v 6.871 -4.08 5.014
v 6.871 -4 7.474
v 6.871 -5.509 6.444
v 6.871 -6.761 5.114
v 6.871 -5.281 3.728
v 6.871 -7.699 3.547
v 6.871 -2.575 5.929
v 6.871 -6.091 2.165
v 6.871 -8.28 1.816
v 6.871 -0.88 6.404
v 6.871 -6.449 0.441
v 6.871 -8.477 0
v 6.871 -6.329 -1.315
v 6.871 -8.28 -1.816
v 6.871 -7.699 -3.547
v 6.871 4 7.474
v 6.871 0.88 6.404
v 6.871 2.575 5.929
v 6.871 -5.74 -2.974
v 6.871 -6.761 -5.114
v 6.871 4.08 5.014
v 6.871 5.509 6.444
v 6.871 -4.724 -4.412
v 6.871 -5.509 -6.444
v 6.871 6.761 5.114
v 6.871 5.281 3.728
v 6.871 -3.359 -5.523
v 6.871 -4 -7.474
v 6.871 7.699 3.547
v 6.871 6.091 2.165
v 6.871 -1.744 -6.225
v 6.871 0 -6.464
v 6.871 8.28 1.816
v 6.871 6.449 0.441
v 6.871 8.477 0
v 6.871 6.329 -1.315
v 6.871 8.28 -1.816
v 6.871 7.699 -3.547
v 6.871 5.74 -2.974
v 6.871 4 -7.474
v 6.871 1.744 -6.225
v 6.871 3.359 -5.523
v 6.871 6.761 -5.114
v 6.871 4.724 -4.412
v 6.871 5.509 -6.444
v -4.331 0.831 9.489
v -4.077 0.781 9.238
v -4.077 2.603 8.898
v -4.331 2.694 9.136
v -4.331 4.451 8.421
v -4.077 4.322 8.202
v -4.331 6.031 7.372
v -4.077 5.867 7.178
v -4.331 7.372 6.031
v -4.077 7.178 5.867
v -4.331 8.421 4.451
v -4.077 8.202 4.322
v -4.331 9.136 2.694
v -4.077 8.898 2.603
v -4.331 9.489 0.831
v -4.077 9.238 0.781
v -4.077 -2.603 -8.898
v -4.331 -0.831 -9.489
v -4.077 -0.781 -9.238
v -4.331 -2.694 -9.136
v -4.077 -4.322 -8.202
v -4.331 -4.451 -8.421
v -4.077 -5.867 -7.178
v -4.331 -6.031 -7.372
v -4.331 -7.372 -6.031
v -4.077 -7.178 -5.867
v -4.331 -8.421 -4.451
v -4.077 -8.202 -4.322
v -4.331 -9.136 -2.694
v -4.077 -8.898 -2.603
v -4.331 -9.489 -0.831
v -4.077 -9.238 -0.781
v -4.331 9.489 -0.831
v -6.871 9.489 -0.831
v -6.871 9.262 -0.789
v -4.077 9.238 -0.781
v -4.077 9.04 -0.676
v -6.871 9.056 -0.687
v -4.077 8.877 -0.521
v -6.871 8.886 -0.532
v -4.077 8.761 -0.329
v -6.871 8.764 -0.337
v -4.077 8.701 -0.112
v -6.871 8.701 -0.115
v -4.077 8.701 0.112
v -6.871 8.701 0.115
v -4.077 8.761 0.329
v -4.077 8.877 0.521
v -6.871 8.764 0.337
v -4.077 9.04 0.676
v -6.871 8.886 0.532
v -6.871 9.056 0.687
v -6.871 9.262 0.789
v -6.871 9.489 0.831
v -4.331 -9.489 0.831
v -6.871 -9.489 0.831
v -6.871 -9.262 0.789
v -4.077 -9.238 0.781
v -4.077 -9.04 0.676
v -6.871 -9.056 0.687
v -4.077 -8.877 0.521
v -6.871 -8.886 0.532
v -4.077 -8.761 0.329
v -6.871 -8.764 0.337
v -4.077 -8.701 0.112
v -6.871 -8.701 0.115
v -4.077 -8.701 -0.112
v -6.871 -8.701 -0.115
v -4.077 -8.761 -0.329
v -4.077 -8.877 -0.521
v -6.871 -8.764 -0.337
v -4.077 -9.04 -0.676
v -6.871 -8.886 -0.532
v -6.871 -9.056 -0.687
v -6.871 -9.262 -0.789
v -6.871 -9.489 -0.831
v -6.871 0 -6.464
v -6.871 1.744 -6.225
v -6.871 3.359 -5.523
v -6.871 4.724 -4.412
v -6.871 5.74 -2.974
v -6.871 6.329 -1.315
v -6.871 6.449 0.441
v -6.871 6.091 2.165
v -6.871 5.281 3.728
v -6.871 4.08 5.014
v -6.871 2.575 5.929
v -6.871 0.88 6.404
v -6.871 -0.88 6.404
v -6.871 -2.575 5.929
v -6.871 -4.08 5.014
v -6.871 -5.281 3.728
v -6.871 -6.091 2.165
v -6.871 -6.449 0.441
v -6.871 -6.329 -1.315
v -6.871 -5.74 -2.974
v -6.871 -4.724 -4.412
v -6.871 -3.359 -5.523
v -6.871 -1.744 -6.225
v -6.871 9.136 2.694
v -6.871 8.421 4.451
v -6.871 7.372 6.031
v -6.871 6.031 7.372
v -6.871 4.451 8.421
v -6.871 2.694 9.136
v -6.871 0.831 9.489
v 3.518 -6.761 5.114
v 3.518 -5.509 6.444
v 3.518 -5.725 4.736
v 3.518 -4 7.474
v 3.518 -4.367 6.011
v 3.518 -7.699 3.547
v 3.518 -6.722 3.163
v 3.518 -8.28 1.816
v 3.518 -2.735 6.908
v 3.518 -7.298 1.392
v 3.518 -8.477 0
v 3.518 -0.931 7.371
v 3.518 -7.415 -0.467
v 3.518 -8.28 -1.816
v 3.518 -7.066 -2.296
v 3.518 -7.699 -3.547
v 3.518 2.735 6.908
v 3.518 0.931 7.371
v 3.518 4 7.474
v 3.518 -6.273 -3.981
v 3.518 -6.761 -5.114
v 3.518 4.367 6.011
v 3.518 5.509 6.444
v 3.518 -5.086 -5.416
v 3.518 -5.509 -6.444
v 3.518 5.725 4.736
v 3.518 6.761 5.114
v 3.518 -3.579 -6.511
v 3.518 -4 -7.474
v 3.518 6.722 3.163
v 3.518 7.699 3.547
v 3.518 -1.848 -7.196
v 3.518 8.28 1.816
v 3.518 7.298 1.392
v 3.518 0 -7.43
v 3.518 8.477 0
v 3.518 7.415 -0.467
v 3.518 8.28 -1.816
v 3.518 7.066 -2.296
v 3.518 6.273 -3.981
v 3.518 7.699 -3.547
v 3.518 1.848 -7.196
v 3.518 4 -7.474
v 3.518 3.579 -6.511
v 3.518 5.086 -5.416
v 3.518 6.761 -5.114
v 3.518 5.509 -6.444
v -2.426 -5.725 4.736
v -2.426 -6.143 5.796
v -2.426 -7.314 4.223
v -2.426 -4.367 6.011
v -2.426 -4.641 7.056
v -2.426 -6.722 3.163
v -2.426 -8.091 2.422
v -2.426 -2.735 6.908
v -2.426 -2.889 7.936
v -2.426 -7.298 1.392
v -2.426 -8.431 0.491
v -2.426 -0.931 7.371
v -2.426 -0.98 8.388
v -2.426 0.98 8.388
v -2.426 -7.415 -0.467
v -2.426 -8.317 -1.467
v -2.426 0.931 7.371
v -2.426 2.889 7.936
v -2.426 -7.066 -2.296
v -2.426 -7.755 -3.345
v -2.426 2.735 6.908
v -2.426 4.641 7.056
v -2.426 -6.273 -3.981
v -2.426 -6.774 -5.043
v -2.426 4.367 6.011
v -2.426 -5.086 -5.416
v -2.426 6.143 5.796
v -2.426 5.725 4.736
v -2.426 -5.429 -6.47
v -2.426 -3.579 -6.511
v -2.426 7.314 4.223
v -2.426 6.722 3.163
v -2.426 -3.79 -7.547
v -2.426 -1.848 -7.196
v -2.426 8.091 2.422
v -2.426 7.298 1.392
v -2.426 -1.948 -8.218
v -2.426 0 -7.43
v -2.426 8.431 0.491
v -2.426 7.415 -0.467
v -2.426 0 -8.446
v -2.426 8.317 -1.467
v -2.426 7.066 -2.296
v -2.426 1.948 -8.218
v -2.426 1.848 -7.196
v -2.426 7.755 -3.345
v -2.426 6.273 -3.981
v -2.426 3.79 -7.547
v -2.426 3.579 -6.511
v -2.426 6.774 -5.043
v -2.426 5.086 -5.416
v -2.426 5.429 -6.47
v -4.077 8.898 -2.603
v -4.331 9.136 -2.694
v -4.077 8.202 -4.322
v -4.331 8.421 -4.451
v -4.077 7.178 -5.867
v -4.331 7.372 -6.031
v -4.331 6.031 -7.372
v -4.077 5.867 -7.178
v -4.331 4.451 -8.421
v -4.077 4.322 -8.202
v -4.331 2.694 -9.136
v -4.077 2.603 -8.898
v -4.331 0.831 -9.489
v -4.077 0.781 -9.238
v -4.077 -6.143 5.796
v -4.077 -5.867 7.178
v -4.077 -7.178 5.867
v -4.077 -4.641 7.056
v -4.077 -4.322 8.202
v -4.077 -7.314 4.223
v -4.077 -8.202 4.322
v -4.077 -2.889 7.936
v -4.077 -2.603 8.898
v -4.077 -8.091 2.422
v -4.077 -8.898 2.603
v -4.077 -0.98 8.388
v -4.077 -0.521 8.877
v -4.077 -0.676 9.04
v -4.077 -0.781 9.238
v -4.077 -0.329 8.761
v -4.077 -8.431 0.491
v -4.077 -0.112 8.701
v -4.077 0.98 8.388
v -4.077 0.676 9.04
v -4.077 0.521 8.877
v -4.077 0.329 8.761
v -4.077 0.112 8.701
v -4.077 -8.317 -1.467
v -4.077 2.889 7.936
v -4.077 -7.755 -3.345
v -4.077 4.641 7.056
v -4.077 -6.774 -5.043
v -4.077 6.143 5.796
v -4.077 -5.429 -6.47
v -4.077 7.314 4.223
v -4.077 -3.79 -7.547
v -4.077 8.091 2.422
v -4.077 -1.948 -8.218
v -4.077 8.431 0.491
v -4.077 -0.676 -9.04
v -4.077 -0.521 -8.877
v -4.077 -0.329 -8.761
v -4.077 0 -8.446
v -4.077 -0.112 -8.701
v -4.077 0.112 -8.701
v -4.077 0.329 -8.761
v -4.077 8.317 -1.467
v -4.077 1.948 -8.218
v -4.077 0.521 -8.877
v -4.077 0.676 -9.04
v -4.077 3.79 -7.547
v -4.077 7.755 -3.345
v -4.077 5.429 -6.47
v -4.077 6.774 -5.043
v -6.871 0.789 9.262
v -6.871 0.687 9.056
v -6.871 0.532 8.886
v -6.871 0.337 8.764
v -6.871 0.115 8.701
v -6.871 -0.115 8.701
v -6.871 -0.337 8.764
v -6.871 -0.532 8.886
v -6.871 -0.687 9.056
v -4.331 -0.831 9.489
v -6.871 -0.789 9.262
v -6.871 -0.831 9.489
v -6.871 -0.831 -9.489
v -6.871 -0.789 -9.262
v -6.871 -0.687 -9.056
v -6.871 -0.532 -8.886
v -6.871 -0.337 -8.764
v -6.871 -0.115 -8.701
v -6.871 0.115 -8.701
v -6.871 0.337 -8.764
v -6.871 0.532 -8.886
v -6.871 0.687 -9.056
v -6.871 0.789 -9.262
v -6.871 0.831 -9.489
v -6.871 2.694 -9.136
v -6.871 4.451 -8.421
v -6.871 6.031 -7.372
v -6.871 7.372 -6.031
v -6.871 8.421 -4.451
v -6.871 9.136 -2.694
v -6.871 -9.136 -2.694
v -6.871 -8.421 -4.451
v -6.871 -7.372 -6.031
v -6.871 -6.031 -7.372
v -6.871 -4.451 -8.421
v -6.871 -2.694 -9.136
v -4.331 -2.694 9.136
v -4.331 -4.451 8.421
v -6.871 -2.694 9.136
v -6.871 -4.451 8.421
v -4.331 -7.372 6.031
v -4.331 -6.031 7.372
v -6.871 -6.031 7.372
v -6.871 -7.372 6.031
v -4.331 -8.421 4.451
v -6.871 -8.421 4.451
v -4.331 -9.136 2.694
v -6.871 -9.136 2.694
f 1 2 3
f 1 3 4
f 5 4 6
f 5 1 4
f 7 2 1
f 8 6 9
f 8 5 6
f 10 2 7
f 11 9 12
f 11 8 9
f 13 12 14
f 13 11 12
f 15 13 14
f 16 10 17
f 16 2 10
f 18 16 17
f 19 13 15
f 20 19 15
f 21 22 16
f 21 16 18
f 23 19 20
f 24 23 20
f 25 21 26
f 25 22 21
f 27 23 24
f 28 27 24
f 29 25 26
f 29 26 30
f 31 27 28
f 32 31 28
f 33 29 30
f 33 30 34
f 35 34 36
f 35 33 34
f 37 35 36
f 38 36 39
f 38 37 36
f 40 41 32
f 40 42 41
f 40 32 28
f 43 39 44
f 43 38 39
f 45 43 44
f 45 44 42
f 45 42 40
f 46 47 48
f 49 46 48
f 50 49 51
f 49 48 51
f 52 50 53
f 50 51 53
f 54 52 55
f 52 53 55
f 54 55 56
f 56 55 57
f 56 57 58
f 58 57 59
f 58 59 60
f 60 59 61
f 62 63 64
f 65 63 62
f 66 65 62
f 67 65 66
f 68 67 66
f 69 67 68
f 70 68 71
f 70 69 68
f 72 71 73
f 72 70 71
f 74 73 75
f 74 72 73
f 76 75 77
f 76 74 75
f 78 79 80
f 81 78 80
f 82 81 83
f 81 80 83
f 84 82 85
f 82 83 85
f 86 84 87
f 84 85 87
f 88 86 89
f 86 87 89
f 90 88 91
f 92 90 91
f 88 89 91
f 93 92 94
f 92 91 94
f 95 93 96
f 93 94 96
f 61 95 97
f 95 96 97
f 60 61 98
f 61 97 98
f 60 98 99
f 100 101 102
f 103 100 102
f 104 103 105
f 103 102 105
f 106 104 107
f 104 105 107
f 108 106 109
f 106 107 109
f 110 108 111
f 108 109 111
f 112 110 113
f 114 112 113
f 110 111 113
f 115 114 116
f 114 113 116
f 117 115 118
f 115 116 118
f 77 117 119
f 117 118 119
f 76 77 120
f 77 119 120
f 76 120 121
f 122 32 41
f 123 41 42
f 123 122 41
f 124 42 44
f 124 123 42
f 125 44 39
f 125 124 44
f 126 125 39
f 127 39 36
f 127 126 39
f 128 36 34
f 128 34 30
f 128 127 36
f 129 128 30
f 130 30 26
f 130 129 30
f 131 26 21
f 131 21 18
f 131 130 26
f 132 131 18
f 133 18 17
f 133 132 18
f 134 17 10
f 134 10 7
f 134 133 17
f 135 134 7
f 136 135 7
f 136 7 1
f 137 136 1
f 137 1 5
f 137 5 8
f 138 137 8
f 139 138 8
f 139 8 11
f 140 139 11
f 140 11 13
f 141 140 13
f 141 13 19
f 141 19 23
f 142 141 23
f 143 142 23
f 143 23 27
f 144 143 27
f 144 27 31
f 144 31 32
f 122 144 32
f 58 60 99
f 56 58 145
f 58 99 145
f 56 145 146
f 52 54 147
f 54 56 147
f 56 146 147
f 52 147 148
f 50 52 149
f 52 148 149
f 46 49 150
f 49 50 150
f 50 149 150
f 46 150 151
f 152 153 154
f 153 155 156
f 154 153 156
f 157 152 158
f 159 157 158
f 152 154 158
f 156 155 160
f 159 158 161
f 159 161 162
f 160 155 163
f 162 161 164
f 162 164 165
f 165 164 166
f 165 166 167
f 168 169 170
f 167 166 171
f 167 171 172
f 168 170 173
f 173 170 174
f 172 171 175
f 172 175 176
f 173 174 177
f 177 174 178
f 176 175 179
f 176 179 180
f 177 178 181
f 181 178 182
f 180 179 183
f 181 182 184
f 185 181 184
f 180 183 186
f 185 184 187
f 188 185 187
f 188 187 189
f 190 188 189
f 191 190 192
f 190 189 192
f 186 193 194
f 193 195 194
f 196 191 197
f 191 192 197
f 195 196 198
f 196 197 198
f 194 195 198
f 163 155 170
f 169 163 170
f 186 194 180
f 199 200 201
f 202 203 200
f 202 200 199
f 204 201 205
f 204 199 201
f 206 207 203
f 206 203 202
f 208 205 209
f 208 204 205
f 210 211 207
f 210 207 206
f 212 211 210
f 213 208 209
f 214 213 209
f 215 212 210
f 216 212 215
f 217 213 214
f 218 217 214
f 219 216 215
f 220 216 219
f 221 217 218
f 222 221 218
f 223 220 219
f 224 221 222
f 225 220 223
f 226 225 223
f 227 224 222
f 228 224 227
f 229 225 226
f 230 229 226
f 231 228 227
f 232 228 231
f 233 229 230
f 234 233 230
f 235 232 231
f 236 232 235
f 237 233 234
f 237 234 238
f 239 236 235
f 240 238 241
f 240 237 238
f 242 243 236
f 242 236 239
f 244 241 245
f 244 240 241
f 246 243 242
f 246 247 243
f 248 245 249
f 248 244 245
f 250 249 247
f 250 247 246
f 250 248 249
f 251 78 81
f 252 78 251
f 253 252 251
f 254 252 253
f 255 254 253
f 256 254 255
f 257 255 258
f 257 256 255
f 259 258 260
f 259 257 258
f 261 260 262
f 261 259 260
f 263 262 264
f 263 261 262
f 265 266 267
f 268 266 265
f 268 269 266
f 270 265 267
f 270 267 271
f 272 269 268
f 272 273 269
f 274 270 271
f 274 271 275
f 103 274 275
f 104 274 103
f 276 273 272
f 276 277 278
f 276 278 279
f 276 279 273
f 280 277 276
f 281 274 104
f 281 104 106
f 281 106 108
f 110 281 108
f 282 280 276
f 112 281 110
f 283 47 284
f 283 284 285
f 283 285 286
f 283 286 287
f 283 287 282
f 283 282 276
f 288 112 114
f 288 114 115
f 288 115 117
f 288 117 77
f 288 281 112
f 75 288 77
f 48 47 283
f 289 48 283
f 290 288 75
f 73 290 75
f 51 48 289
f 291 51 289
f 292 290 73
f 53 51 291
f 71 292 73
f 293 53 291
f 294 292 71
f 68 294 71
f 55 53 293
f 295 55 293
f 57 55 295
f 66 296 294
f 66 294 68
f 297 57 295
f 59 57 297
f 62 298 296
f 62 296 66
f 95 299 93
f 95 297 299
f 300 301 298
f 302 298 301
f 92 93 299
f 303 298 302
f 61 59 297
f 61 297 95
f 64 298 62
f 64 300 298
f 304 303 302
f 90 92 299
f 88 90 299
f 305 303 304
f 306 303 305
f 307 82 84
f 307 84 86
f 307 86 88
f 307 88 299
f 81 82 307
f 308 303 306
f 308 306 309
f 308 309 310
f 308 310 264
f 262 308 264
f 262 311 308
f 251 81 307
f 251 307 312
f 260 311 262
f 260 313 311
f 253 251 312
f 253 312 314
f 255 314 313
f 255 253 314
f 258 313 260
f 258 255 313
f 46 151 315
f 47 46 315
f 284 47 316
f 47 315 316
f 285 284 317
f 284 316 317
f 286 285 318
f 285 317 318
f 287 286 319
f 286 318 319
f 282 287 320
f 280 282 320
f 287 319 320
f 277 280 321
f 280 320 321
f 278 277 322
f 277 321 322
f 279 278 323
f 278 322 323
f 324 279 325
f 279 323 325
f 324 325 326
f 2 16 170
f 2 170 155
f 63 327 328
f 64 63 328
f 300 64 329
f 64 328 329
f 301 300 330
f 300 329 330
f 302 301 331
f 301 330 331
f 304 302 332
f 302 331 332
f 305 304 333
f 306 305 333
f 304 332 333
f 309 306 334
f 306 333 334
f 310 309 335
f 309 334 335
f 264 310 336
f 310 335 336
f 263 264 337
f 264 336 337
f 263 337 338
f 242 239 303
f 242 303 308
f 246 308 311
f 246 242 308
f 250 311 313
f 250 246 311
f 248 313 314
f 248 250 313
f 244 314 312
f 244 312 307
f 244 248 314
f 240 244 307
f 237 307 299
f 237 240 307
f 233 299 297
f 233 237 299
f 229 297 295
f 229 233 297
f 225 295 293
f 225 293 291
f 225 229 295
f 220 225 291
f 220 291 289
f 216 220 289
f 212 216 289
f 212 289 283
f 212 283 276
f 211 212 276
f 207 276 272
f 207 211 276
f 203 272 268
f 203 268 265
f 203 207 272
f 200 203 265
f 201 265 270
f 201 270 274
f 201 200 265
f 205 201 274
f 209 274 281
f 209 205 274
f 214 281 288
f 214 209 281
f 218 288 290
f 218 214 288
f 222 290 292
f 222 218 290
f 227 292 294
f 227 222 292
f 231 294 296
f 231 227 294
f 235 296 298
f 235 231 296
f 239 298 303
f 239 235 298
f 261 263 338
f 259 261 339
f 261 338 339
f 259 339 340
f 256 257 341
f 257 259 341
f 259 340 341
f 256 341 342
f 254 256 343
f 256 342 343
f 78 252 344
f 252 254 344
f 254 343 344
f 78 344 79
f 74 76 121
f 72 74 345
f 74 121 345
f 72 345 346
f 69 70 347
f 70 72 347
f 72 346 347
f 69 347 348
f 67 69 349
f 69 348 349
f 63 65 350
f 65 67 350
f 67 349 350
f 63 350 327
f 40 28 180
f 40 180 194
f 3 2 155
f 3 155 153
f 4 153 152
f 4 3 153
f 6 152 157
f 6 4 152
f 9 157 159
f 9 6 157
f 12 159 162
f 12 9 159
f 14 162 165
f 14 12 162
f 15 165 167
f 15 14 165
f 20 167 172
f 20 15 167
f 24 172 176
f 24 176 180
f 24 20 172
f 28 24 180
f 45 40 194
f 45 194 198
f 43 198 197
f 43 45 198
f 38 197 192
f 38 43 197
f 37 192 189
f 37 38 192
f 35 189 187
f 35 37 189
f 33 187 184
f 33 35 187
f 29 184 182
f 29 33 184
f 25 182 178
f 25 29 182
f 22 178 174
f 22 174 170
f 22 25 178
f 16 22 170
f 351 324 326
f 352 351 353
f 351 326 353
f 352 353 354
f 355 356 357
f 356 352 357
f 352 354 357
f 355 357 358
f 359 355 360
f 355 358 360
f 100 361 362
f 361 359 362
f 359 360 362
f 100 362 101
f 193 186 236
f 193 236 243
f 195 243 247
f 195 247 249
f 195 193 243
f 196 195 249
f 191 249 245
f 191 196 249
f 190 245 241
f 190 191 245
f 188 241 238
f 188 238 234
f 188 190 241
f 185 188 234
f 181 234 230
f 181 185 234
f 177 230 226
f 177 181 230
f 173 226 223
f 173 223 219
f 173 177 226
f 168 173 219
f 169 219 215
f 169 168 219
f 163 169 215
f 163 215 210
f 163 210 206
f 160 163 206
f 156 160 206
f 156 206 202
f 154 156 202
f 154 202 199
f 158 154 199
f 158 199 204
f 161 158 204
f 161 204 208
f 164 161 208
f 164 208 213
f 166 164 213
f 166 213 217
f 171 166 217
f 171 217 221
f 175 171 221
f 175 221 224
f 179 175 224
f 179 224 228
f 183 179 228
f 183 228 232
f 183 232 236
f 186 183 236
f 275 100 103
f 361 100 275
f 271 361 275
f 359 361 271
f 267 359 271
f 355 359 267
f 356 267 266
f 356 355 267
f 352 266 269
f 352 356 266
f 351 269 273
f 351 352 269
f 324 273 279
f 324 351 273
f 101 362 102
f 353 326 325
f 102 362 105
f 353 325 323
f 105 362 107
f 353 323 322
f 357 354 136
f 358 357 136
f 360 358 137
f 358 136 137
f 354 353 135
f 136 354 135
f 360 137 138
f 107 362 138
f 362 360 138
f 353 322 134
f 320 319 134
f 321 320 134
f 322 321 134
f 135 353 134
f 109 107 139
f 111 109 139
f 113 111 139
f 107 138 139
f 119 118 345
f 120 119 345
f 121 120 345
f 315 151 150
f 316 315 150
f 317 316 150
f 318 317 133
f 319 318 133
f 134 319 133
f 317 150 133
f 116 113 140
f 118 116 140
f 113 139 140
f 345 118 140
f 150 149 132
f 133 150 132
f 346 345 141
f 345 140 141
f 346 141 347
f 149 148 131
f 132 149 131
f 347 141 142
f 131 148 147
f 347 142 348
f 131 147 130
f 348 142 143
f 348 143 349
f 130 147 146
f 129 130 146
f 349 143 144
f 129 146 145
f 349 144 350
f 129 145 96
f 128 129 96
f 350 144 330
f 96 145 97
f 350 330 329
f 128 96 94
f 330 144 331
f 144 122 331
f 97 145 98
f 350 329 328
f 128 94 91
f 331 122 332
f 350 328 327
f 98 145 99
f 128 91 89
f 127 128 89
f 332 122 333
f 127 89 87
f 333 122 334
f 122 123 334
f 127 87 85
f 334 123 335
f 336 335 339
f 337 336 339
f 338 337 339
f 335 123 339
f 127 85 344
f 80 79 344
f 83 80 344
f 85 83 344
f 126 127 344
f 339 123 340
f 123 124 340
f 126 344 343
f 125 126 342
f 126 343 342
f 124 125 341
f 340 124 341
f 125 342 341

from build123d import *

# Parameters (mm, degrees)
SKETCH1_R           = 6.4643
BOSS_EXTRUDE1_DEPTH = 6.8707
SKETCH2_R           = 12.068907195
SKETCH2_R_2         = 7.4295
CUT_EXTRUDE1_DEPTH  = 13.7414
BOSS_EXTRUDE3_START = -4.445
SKETCH3_R           = 6.4643
BOSS_EXTRUDE3_DEPTH = 4.445
SKETCH4_R           = 13.191665885
SKETCH4_R_2         = 8.4455
CUT_EXTRUDE2_DEPTH  = 1.651
CHAMFER1_SIZE       = 0.254


with BuildPart() as part:
    # Sketch1 → Boss-Extrude1 (new, symmetric)
    with BuildSketch(Plane(origin=(0, 0, 0), x_dir=(0, 0, -1), z_dir=(1, 0, 0))):
        with BuildLine():
            Line((-7.47395, 4.000479841), (-7.47395, -4.000479841))
            ThreePointArc((-7.47395, -4.000479841), (0, -8.47725), (7.47395, -4.000479841))
            Line((7.47395, -4.000479841), (7.47395, 4.000479841))
            ThreePointArc((7.47395, 4.000479841), (0, 8.47725), (-7.47395, 4.000479841))
        make_face()
        Circle(SKETCH1_R, mode=Mode.SUBTRACT)
    extrude(amount=BOSS_EXTRUDE1_DEPTH, both=True)

    # Sketch2 → Cut-Extrude1 (cut)
    with BuildSketch(Plane(origin=(3.5179, 0, 0), x_dir=(0, 0, -1), z_dir=(1, 0, 0))):
        Circle(SKETCH2_R)
        Circle(SKETCH2_R_2, mode=Mode.SUBTRACT)
    extrude(amount=-CUT_EXTRUDE1_DEPTH, mode=Mode.SUBTRACT)

    # Sketch3 → Boss-Extrude3 (add)
    with BuildSketch(Plane(origin=(-2.4257, 0, 0), x_dir=(0, 0, -1), z_dir=(1, 0, 0)).offset(BOSS_EXTRUDE3_START)):
        with BuildLine():
            ThreePointArc((-0.831056545, 9.488675883), (-6.735192091, 6.735192091), (-9.488675883, 0.831056545))
            ThreePointArc((-9.488675883, 0.831056545), (-8.69315, 0), (-9.488675883, -0.831056545))
            ThreePointArc((-9.488675883, -0.831056545), (-6.735192091, -6.735192091), (-0.831056545, -9.488675883))
            ThreePointArc((-0.831056545, -9.488675883), (0, -8.69315), (0.831056545, -9.488675883))
            ThreePointArc((0.831056545, -9.488675883), (6.735192091, -6.735192091), (9.488675883, -0.831056545))
            ThreePointArc((9.488675883, -0.831056545), (8.69315, 0), (9.488675883, 0.831056545))
            ThreePointArc((9.488675883, 0.831056545), (6.735192091, 6.735192091), (0.831056545, 9.488675883))
            ThreePointArc((0.831056545, 9.488675883), (0, 8.69315), (-0.831056545, 9.488675883))
        make_face()
        Circle(SKETCH3_R, mode=Mode.SUBTRACT)
    extrude(amount=BOSS_EXTRUDE3_DEPTH)

    # Sketch4 → Cut-Extrude2 (cut)
    with BuildSketch(Plane(origin=(-2.4257, 0, 0), x_dir=(0, 0, -1), z_dir=(1, 0, 0))):
        Circle(SKETCH4_R)
        Circle(SKETCH4_R_2, mode=Mode.SUBTRACT)
    extrude(amount=-CUT_EXTRUDE2_DEPTH, mode=Mode.SUBTRACT)

    # Chamfer1
    chamfer1_edges = [part.edges().sort_by_distance(p)[0] for p in [
        (-4.0767, 6.735192091, -6.735192091),
        (-4.0767, 6.735192091, 6.735192091),
        (-4.0767, -6.735192091, -6.735192091),
        (-4.0767, -6.735192091, 6.735192091),
    ]]
    chamfer(chamfer1_edges, length=CHAMFER1_SIZE)


solid = part.part
